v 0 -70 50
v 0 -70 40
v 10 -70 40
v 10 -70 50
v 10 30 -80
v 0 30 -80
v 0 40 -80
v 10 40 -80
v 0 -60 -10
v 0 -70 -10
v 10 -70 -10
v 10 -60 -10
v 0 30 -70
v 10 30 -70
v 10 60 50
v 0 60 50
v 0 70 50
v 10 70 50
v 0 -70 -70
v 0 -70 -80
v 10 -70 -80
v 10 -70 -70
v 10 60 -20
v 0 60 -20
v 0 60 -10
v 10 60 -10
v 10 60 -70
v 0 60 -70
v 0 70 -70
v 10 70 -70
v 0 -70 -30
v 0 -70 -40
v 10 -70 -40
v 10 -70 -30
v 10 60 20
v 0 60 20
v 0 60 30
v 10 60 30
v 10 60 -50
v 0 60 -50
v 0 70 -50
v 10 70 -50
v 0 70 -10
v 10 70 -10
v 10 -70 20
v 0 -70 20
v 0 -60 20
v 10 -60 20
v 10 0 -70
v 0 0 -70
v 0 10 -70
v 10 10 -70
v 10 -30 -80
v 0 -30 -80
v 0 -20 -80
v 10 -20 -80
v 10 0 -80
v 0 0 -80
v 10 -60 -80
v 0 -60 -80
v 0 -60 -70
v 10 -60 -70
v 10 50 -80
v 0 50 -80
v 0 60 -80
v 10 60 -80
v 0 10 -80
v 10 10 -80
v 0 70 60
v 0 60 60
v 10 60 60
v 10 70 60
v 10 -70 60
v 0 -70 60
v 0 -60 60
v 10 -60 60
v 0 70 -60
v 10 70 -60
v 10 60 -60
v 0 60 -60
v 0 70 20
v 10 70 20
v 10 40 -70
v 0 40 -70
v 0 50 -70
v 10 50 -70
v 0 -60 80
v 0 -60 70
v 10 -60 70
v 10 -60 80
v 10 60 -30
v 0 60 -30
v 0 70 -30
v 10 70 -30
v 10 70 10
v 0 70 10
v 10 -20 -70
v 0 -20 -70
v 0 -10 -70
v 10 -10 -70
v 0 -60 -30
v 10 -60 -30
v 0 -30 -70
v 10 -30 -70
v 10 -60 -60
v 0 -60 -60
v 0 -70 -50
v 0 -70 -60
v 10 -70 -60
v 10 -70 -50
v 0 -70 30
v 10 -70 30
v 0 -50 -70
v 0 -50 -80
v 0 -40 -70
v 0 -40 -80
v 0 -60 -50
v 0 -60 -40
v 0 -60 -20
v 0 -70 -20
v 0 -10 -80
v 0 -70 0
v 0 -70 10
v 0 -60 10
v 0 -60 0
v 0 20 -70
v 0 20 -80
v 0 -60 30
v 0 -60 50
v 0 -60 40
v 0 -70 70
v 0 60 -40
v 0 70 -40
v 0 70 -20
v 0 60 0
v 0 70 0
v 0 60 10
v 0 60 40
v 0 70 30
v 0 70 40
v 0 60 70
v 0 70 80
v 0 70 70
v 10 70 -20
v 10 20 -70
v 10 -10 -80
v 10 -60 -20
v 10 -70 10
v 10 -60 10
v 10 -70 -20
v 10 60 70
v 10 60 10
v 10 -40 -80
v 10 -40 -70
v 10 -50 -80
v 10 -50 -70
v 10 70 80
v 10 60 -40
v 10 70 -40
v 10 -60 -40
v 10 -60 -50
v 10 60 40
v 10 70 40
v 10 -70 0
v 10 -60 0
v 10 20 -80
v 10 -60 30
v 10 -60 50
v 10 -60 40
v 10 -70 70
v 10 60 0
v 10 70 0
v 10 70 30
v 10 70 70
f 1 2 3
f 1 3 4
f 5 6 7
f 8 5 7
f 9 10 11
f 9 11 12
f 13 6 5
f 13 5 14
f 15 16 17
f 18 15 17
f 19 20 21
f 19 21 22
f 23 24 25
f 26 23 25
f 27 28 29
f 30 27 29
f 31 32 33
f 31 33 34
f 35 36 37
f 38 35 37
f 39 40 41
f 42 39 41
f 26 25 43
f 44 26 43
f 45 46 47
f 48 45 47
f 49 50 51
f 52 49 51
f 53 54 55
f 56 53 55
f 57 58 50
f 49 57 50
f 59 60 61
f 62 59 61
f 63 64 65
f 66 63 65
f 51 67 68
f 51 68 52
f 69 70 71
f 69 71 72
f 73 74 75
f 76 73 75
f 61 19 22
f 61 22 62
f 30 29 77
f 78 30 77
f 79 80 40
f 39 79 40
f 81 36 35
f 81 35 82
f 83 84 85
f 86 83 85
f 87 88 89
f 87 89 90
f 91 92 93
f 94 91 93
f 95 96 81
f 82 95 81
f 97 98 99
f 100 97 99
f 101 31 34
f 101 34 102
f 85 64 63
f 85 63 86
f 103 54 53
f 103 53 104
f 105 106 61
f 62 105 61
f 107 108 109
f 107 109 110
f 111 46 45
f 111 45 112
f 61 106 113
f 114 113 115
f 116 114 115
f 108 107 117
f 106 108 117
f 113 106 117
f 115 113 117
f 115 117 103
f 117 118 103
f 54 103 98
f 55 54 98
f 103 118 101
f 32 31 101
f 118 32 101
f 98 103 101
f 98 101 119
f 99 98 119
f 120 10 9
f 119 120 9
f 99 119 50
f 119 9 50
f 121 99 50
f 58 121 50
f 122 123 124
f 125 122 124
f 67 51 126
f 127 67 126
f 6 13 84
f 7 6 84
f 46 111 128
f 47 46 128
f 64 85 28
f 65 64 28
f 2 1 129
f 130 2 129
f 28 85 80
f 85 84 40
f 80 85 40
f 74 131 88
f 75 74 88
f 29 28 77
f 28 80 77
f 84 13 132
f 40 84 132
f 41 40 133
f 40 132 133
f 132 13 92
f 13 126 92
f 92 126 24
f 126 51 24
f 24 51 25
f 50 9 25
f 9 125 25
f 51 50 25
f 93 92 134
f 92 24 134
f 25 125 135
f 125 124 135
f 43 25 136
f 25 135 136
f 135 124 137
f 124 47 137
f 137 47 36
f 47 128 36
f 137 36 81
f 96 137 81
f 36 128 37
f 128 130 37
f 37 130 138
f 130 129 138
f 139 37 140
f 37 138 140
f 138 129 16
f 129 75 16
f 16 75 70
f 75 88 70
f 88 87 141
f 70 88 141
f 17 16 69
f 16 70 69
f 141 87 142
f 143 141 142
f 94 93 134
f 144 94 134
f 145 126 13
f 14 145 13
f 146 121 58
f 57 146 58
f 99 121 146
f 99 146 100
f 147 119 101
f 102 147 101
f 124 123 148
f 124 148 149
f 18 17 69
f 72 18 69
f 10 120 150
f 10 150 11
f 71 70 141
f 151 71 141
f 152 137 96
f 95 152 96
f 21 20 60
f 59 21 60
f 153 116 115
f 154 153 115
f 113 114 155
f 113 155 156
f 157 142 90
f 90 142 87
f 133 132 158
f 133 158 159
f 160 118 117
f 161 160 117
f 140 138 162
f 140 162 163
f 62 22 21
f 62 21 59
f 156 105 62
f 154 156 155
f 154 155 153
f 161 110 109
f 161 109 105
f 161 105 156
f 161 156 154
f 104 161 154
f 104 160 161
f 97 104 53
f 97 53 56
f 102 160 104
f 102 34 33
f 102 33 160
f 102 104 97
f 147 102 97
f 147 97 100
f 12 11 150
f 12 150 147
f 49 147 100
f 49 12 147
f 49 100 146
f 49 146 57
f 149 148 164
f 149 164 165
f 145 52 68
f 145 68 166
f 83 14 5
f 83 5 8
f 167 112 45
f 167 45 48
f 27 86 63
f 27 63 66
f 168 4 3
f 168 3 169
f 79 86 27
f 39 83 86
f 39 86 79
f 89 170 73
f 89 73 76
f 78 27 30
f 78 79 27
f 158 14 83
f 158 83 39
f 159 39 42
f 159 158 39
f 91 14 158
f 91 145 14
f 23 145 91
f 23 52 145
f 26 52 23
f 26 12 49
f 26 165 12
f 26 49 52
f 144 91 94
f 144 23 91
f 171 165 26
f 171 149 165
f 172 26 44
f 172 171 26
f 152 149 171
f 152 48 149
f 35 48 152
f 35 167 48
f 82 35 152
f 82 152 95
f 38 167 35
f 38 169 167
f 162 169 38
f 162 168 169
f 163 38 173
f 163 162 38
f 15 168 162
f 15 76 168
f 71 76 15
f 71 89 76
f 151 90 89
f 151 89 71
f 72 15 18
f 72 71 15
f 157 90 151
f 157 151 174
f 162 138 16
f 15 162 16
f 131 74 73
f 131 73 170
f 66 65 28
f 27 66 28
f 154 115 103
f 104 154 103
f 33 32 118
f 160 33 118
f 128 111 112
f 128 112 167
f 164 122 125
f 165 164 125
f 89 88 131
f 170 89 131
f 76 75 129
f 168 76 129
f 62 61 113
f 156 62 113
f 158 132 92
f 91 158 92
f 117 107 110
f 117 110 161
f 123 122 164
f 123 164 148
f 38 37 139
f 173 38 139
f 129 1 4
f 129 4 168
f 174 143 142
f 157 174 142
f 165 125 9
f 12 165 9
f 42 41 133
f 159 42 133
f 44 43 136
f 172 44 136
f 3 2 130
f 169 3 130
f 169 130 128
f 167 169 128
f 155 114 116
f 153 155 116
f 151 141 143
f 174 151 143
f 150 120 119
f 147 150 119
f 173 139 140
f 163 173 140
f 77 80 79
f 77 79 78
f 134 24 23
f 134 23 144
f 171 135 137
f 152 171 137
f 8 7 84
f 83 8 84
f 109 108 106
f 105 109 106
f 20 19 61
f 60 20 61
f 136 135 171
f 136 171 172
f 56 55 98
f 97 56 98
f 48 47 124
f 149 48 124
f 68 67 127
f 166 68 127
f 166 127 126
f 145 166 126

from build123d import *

# Parameters (mm, degrees)
F0_W     = 10
F0_H     = 10
F1_DEPTH = 10


with BuildPart() as f1:
    # F0 (on Right) → F1 (new body)
    with BuildSketch(Plane.YZ):
        with Locations((-65, -75)):
            Rectangle(F0_W, F0_H)
        with Locations((55, -75)):
            Rectangle(F0_W, F0_H)
        with Locations((65, -65)):
            Rectangle(F0_W, F0_H)
        Polygon((50, -70), (60, -70), (60, -60), (60, -50), (60, -40), (60, -30), (60, -20), (60, -10), (60, 0), (60, 10), (60, 20), (60, 30), (60, 40), (60, 50), (60, 60), (60, 70), (50, 70), (40, 70), (30, 70), (20, 70), (10, 70), (0, 70), (-10, 70), (-20, 70), (-30, 70), (-40, 70), (-50, 70), (-60, 70), (-60, 60), (-60, 50), (-60, 40), (-60, 30), (-60, 20), (-60, 10), (-60, 0), (-60, -10), (-60, -20), (-60, -30), (-60, -40), (-60, -50), (-60, -60), (-60, -70), (-50, -70), (-40, -70), (-30, -70), (-20, -70), (-10, -70), (0, -70), (10, -70), (20, -70), (30, -70), (40, -70), align=None)
        with Locations((35, -75)):
            Rectangle(F0_W, F0_H)
        with Locations((65, -45)):
            Rectangle(F0_W, F0_H)
        with Locations((15, -75)):
            Rectangle(F0_W, F0_H)
        with Locations((65, -25)):
            Rectangle(F0_W, F0_H)
        with Locations((-5, -75)):
            Rectangle(F0_W, F0_H)
        with Locations((65, -5)):
            Rectangle(F0_W, F0_H)
        with Locations((-25, -75)):
            Rectangle(F0_W, F0_H)
        with Locations((65, 15)):
            Rectangle(F0_W, F0_H)
        with Locations((-45, -75)):
            Rectangle(F0_W, F0_H)
        with Locations((65, 35)):
            Rectangle(F0_W, F0_H)
        with Locations((65, 55)):
            Rectangle(F0_W, F0_H)
        with Locations((-65, -55)):
            Rectangle(F0_W, F0_H)
        with Locations((55, 75)):
            Rectangle(F0_W, F0_H)
        with Locations((65, 75)):
            Rectangle(F0_W, F0_H)
        with Locations((-65, -35)):
            Rectangle(F0_W, F0_H)
        with Locations((45, 75)):
            Rectangle(F0_W, F0_H)
        with Locations((35, 75)):
            Rectangle(F0_W, F0_H)
        with Locations((-65, -15)):
            Rectangle(F0_W, F0_H)
        with Locations((25, 75)):
            Rectangle(F0_W, F0_H)
        with Locations((15, 75)):
            Rectangle(F0_W, F0_H)
        with Locations((-65, 5)):
            Rectangle(F0_W, F0_H)
        with Locations((5, 75)):
            Rectangle(F0_W, F0_H)
        with Locations((-5, 75)):
            Rectangle(F0_W, F0_H)
        with Locations((-65, 25)):
            Rectangle(F0_W, F0_H)
        with Locations((-15, 75)):
            Rectangle(F0_W, F0_H)
        with Locations((-25, 75)):
            Rectangle(F0_W, F0_H)
        with Locations((-65, 45)):
            Rectangle(F0_W, F0_H)
        with Locations((-35, 75)):
            Rectangle(F0_W, F0_H)
        with Locations((-45, 75)):
            Rectangle(F0_W, F0_H)
        with Locations((-65, 65)):
            Rectangle(F0_W, F0_H)
        with Locations((-55, 75)):
            Rectangle(F0_W, F0_H)
    extrude(amount=F1_DEPTH)


solid = f1.part
